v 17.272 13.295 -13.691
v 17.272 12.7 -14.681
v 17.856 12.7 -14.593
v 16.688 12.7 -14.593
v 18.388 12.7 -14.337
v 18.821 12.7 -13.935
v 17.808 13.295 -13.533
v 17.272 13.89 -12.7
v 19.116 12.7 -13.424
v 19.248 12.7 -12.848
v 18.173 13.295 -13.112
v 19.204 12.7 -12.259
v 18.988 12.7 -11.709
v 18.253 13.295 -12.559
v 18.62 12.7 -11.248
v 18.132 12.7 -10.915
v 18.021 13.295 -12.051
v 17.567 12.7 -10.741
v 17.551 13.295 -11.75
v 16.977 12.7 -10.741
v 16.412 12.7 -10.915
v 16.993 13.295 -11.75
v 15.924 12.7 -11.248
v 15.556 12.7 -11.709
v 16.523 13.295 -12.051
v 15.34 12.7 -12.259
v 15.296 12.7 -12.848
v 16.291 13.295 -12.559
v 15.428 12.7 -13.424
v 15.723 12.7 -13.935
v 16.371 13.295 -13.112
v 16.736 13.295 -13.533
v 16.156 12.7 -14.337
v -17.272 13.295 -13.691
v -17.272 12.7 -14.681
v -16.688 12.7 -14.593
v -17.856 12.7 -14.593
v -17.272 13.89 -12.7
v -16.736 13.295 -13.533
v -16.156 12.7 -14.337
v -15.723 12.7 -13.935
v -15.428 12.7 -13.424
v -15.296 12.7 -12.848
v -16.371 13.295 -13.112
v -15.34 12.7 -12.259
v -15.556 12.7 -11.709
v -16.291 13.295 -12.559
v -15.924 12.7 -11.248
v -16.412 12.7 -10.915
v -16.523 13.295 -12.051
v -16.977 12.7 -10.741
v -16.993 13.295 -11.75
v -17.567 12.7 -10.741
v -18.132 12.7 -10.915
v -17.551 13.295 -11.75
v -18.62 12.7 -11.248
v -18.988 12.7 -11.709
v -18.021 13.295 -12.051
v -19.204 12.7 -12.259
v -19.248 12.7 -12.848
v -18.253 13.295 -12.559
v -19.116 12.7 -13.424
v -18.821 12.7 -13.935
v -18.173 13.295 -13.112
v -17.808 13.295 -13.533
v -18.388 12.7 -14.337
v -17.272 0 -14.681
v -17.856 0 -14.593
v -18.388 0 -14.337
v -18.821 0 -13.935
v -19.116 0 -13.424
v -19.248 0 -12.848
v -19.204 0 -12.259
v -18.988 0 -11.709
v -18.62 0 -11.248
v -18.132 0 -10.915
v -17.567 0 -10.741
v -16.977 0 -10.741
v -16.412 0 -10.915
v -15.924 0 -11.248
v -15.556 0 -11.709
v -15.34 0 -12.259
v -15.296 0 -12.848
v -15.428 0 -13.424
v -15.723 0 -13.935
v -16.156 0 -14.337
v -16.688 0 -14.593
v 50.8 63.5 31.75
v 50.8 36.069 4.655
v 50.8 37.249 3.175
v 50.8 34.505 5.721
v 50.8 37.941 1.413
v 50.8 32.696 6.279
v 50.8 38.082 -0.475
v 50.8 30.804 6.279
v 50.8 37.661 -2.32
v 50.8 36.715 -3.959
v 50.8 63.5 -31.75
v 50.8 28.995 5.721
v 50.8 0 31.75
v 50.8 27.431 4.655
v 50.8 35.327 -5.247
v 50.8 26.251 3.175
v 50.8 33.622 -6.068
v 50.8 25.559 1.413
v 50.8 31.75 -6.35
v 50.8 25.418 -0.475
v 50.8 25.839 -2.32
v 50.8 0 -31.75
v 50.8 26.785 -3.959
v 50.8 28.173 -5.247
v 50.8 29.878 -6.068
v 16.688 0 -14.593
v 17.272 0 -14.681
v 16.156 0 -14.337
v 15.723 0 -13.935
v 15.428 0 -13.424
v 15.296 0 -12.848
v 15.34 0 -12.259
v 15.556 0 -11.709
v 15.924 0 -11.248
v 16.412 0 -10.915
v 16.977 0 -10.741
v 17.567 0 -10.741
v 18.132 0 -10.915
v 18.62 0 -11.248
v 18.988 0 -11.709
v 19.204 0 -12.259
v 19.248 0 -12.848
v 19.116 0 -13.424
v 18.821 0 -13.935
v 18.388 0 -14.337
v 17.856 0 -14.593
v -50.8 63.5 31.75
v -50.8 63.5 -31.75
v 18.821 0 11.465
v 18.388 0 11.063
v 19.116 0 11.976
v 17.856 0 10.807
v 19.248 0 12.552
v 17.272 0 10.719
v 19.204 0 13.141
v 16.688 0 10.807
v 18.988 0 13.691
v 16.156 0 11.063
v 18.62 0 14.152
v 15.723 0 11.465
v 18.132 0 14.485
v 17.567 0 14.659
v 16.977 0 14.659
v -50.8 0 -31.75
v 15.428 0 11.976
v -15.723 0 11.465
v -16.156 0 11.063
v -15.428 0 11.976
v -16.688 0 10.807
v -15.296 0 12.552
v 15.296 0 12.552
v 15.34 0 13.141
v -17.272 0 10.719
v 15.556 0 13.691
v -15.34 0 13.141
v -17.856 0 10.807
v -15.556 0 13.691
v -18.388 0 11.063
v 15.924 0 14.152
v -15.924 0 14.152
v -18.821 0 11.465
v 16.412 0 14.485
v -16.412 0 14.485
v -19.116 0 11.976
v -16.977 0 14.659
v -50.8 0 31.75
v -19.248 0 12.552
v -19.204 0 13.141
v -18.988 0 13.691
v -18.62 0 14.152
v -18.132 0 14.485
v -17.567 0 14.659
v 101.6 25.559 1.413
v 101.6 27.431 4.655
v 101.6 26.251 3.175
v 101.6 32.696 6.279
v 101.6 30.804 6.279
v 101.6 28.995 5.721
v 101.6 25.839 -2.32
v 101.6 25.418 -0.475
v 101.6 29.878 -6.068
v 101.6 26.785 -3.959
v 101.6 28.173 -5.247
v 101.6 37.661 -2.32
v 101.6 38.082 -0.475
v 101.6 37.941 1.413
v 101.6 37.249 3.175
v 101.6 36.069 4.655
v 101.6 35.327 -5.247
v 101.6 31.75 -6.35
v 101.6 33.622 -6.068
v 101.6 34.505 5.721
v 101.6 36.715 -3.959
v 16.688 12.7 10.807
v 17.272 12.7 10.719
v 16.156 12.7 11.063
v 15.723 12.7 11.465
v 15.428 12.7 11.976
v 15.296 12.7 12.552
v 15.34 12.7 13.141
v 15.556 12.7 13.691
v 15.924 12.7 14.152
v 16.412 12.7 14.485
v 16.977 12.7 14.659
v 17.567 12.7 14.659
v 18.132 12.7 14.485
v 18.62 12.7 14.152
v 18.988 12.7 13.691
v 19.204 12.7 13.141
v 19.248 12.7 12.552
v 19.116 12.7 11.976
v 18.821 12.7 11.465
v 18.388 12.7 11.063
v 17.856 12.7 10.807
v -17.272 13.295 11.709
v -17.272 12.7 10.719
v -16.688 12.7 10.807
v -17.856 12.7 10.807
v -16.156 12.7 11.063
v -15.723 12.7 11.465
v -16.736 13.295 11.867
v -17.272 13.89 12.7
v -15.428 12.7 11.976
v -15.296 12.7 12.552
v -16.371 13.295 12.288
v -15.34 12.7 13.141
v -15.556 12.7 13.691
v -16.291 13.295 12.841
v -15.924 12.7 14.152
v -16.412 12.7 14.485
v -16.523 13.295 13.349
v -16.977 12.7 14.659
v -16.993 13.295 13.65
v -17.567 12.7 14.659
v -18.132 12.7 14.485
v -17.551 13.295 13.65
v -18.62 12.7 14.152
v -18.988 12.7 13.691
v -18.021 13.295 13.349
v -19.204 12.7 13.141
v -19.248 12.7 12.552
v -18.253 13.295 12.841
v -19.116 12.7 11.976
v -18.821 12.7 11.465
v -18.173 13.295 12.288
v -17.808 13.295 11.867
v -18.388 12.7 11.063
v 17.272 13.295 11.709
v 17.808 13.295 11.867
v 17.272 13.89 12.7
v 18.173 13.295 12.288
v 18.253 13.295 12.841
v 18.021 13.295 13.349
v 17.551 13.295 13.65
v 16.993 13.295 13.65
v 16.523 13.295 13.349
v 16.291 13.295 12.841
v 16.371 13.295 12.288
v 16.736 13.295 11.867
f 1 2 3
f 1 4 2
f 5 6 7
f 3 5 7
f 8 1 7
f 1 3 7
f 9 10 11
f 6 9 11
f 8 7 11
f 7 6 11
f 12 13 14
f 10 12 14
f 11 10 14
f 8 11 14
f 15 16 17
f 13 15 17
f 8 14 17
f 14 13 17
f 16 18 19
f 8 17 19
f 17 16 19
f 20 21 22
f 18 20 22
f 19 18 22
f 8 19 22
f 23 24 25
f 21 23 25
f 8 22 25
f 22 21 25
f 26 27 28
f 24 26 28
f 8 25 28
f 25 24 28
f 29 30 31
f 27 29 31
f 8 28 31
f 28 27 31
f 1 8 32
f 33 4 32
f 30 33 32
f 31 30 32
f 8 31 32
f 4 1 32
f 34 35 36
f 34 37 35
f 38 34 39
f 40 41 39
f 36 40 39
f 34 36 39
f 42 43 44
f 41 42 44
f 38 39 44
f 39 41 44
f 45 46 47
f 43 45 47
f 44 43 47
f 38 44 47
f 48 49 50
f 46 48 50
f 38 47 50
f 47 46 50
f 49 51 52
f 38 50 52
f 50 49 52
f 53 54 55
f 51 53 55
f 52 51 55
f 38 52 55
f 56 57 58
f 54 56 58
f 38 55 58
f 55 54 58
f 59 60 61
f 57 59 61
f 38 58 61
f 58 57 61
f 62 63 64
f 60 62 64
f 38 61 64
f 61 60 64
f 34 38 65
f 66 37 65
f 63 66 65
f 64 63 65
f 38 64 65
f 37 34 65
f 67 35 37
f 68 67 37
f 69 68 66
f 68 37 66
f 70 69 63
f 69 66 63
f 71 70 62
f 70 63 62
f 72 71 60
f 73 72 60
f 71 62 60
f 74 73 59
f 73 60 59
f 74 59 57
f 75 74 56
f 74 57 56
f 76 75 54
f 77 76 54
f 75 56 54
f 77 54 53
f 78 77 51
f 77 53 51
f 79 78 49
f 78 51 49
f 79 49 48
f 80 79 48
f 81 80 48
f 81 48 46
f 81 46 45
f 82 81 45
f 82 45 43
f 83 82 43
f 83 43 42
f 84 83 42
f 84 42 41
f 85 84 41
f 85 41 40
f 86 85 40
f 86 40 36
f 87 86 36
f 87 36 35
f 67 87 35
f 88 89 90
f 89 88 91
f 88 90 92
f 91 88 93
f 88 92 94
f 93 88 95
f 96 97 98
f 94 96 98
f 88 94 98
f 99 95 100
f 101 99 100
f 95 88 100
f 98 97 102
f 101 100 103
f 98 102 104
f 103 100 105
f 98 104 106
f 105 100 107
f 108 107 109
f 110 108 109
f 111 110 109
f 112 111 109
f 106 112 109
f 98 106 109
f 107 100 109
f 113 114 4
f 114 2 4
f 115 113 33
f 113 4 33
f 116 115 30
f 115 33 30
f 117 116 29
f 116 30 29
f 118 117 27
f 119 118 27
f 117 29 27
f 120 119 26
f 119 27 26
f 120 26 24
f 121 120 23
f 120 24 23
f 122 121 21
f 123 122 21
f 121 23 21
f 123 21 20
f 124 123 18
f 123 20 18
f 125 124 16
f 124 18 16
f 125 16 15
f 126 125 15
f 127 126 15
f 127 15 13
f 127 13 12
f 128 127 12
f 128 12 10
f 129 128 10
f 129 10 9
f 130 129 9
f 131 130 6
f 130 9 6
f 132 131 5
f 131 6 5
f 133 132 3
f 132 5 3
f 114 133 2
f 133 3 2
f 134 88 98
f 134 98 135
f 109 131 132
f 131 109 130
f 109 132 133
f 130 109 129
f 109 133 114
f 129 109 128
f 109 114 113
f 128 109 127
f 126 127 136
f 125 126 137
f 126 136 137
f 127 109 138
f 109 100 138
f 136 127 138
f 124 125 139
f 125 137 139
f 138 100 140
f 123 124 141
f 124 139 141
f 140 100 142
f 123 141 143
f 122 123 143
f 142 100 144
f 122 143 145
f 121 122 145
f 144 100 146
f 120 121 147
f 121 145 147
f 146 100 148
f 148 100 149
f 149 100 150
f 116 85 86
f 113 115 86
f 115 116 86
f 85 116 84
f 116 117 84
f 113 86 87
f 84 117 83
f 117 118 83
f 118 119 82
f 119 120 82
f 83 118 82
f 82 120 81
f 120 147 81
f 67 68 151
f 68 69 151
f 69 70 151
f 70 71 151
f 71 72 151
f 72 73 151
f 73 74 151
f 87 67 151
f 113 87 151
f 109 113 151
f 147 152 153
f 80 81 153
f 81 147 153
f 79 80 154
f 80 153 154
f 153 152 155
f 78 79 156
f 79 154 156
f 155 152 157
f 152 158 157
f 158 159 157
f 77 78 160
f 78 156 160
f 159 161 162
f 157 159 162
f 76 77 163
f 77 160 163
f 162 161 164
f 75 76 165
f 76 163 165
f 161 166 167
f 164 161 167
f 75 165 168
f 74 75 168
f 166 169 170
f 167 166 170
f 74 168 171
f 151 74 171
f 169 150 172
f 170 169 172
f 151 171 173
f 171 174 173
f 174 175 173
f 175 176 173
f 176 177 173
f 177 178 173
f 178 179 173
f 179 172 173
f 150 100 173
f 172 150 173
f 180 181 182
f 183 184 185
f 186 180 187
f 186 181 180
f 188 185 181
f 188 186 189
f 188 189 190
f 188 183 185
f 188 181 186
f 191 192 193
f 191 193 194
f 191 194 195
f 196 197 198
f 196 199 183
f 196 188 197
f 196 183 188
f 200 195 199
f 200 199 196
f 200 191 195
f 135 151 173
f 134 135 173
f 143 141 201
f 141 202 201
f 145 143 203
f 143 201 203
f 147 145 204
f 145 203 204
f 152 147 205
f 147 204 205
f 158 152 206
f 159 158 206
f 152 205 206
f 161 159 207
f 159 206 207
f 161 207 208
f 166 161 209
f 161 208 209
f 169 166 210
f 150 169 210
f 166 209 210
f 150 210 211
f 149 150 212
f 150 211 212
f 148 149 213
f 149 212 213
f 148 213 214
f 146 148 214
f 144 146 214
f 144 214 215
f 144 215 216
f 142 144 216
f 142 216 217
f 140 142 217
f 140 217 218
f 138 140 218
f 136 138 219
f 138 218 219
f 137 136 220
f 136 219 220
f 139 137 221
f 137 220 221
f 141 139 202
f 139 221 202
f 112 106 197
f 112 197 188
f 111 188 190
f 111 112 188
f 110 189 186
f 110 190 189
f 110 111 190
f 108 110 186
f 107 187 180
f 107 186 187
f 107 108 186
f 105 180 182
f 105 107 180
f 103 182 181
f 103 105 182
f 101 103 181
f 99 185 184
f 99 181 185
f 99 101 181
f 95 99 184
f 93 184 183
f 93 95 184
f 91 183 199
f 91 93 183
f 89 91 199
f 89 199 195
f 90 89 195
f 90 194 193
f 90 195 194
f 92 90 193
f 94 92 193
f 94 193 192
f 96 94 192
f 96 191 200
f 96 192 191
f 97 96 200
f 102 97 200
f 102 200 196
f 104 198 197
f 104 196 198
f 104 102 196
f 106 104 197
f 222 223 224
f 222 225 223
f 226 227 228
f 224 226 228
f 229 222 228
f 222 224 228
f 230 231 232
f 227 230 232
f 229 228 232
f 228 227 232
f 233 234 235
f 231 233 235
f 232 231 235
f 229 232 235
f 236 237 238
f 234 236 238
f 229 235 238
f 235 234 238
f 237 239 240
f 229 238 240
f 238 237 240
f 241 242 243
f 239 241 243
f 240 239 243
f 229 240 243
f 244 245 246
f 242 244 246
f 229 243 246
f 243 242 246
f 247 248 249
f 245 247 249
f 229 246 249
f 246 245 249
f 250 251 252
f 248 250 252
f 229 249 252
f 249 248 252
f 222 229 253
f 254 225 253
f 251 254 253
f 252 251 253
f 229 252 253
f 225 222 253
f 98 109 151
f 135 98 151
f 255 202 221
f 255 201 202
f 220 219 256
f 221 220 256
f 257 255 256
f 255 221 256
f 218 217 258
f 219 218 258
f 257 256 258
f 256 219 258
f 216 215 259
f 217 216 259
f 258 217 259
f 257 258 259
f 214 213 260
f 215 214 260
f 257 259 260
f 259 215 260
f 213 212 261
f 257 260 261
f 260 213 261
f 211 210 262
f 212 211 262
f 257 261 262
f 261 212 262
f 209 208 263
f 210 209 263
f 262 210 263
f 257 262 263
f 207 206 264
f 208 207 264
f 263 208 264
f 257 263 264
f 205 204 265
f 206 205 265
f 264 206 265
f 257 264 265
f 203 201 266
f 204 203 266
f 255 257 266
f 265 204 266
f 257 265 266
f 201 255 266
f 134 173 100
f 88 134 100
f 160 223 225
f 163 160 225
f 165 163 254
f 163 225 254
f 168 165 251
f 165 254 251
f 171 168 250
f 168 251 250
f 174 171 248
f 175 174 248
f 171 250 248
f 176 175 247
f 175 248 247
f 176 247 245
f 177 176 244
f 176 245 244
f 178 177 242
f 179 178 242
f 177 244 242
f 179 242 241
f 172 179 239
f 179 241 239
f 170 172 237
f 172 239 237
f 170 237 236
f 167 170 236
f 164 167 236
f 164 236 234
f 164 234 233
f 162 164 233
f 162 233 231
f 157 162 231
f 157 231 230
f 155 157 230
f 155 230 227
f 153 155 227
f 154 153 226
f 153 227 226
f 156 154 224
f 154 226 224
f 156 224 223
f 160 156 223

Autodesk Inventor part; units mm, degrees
ref_plane "YZ Plane" through (0, 0, 0) normal (1, 0, 0) x (0, 1, 0)
ref_plane "XZ Plane" through (0, 0, 0) normal (0, 1, 0) x (-1, 0, 0)
ref_plane "XY Plane" through (0, 0, 0) normal (0, 0, 1) x (1, 0, 0)
sketch "Sketch1" plane through (0, 0, 0) normal (0, 1, 0) x (-1, 0, 0)
  line L0 (50.8, 31.75) -> (-50.8, 31.75)
  line L1 (-50.8, 31.75) -> (-50.8, -31.75)
  line L2 (-50.8, -31.75) -> (50.8, -31.75)
  line L3 (50.8, -31.75) -> (50.8, 31.75)
  line L4 (50.8, 31.75) -> (-50.8, -31.75) construction
  line L5 (-50.8, 31.75) -> (50.8, -31.75) construction
  point P0 (0, 0)
  dimension "d0" = 101.6
  dimension "d1" = 63.5
extrude "Extrusion1" add sketch "Sketch1" along normal blind 63.5
sketch "Sketch2" plane through (0, 0, 0) normal (0, -1, 0) x (1, 0, 0)
  line L0 (17.272, 12.7) -> (-17.272, 12.7) construction
  line L1 (-17.272, 12.7) -> (-17.272, -12.7) construction
  line L2 (-17.272, -12.7) -> (17.272, -12.7) construction
  line L3 (17.272, -12.7) -> (17.272, 12.7) construction
  line L4 (17.272, 12.7) -> (-17.272, -12.7) construction
  line L5 (-17.272, 12.7) -> (17.272, -12.7) construction
  point P0 (0, 0)
  dimension "d5" = 34.544
  dimension "d6" = 25.4
hole "Hole1" at (17.272, 0, -12.7) at (-17.272, 0, -12.7) at (-17.272, 0, 12.7) at (17.272, 0, 12.7) direction (0, 1, 0) diameter 3.9624 depth 12.7 tip angle 118 thread size "10-32 UNF" class "2B" standard "ANSI Unified Screw Threads"
sketch "Sketch3" plane through (50.8, 0, 31.75) normal (1, 0, 0) x (0, 0, -1)
  circle A0 centre (31.75, 31.75) radius 6.35
  line L0 (0, 0) -> (0, 63.5) projected
  line L1 (0, 0) -> (63.5, 0) projected
  point P0 (31.75, 0)
  dimension "d14" = 12.7
  dimension "d15" = 31.75
  dimension "d16" = 31.75
extrude "Extrusion2" add sketch "Sketch3" along normal blind 50.8
properties part number "BaneBot220GearBox"
